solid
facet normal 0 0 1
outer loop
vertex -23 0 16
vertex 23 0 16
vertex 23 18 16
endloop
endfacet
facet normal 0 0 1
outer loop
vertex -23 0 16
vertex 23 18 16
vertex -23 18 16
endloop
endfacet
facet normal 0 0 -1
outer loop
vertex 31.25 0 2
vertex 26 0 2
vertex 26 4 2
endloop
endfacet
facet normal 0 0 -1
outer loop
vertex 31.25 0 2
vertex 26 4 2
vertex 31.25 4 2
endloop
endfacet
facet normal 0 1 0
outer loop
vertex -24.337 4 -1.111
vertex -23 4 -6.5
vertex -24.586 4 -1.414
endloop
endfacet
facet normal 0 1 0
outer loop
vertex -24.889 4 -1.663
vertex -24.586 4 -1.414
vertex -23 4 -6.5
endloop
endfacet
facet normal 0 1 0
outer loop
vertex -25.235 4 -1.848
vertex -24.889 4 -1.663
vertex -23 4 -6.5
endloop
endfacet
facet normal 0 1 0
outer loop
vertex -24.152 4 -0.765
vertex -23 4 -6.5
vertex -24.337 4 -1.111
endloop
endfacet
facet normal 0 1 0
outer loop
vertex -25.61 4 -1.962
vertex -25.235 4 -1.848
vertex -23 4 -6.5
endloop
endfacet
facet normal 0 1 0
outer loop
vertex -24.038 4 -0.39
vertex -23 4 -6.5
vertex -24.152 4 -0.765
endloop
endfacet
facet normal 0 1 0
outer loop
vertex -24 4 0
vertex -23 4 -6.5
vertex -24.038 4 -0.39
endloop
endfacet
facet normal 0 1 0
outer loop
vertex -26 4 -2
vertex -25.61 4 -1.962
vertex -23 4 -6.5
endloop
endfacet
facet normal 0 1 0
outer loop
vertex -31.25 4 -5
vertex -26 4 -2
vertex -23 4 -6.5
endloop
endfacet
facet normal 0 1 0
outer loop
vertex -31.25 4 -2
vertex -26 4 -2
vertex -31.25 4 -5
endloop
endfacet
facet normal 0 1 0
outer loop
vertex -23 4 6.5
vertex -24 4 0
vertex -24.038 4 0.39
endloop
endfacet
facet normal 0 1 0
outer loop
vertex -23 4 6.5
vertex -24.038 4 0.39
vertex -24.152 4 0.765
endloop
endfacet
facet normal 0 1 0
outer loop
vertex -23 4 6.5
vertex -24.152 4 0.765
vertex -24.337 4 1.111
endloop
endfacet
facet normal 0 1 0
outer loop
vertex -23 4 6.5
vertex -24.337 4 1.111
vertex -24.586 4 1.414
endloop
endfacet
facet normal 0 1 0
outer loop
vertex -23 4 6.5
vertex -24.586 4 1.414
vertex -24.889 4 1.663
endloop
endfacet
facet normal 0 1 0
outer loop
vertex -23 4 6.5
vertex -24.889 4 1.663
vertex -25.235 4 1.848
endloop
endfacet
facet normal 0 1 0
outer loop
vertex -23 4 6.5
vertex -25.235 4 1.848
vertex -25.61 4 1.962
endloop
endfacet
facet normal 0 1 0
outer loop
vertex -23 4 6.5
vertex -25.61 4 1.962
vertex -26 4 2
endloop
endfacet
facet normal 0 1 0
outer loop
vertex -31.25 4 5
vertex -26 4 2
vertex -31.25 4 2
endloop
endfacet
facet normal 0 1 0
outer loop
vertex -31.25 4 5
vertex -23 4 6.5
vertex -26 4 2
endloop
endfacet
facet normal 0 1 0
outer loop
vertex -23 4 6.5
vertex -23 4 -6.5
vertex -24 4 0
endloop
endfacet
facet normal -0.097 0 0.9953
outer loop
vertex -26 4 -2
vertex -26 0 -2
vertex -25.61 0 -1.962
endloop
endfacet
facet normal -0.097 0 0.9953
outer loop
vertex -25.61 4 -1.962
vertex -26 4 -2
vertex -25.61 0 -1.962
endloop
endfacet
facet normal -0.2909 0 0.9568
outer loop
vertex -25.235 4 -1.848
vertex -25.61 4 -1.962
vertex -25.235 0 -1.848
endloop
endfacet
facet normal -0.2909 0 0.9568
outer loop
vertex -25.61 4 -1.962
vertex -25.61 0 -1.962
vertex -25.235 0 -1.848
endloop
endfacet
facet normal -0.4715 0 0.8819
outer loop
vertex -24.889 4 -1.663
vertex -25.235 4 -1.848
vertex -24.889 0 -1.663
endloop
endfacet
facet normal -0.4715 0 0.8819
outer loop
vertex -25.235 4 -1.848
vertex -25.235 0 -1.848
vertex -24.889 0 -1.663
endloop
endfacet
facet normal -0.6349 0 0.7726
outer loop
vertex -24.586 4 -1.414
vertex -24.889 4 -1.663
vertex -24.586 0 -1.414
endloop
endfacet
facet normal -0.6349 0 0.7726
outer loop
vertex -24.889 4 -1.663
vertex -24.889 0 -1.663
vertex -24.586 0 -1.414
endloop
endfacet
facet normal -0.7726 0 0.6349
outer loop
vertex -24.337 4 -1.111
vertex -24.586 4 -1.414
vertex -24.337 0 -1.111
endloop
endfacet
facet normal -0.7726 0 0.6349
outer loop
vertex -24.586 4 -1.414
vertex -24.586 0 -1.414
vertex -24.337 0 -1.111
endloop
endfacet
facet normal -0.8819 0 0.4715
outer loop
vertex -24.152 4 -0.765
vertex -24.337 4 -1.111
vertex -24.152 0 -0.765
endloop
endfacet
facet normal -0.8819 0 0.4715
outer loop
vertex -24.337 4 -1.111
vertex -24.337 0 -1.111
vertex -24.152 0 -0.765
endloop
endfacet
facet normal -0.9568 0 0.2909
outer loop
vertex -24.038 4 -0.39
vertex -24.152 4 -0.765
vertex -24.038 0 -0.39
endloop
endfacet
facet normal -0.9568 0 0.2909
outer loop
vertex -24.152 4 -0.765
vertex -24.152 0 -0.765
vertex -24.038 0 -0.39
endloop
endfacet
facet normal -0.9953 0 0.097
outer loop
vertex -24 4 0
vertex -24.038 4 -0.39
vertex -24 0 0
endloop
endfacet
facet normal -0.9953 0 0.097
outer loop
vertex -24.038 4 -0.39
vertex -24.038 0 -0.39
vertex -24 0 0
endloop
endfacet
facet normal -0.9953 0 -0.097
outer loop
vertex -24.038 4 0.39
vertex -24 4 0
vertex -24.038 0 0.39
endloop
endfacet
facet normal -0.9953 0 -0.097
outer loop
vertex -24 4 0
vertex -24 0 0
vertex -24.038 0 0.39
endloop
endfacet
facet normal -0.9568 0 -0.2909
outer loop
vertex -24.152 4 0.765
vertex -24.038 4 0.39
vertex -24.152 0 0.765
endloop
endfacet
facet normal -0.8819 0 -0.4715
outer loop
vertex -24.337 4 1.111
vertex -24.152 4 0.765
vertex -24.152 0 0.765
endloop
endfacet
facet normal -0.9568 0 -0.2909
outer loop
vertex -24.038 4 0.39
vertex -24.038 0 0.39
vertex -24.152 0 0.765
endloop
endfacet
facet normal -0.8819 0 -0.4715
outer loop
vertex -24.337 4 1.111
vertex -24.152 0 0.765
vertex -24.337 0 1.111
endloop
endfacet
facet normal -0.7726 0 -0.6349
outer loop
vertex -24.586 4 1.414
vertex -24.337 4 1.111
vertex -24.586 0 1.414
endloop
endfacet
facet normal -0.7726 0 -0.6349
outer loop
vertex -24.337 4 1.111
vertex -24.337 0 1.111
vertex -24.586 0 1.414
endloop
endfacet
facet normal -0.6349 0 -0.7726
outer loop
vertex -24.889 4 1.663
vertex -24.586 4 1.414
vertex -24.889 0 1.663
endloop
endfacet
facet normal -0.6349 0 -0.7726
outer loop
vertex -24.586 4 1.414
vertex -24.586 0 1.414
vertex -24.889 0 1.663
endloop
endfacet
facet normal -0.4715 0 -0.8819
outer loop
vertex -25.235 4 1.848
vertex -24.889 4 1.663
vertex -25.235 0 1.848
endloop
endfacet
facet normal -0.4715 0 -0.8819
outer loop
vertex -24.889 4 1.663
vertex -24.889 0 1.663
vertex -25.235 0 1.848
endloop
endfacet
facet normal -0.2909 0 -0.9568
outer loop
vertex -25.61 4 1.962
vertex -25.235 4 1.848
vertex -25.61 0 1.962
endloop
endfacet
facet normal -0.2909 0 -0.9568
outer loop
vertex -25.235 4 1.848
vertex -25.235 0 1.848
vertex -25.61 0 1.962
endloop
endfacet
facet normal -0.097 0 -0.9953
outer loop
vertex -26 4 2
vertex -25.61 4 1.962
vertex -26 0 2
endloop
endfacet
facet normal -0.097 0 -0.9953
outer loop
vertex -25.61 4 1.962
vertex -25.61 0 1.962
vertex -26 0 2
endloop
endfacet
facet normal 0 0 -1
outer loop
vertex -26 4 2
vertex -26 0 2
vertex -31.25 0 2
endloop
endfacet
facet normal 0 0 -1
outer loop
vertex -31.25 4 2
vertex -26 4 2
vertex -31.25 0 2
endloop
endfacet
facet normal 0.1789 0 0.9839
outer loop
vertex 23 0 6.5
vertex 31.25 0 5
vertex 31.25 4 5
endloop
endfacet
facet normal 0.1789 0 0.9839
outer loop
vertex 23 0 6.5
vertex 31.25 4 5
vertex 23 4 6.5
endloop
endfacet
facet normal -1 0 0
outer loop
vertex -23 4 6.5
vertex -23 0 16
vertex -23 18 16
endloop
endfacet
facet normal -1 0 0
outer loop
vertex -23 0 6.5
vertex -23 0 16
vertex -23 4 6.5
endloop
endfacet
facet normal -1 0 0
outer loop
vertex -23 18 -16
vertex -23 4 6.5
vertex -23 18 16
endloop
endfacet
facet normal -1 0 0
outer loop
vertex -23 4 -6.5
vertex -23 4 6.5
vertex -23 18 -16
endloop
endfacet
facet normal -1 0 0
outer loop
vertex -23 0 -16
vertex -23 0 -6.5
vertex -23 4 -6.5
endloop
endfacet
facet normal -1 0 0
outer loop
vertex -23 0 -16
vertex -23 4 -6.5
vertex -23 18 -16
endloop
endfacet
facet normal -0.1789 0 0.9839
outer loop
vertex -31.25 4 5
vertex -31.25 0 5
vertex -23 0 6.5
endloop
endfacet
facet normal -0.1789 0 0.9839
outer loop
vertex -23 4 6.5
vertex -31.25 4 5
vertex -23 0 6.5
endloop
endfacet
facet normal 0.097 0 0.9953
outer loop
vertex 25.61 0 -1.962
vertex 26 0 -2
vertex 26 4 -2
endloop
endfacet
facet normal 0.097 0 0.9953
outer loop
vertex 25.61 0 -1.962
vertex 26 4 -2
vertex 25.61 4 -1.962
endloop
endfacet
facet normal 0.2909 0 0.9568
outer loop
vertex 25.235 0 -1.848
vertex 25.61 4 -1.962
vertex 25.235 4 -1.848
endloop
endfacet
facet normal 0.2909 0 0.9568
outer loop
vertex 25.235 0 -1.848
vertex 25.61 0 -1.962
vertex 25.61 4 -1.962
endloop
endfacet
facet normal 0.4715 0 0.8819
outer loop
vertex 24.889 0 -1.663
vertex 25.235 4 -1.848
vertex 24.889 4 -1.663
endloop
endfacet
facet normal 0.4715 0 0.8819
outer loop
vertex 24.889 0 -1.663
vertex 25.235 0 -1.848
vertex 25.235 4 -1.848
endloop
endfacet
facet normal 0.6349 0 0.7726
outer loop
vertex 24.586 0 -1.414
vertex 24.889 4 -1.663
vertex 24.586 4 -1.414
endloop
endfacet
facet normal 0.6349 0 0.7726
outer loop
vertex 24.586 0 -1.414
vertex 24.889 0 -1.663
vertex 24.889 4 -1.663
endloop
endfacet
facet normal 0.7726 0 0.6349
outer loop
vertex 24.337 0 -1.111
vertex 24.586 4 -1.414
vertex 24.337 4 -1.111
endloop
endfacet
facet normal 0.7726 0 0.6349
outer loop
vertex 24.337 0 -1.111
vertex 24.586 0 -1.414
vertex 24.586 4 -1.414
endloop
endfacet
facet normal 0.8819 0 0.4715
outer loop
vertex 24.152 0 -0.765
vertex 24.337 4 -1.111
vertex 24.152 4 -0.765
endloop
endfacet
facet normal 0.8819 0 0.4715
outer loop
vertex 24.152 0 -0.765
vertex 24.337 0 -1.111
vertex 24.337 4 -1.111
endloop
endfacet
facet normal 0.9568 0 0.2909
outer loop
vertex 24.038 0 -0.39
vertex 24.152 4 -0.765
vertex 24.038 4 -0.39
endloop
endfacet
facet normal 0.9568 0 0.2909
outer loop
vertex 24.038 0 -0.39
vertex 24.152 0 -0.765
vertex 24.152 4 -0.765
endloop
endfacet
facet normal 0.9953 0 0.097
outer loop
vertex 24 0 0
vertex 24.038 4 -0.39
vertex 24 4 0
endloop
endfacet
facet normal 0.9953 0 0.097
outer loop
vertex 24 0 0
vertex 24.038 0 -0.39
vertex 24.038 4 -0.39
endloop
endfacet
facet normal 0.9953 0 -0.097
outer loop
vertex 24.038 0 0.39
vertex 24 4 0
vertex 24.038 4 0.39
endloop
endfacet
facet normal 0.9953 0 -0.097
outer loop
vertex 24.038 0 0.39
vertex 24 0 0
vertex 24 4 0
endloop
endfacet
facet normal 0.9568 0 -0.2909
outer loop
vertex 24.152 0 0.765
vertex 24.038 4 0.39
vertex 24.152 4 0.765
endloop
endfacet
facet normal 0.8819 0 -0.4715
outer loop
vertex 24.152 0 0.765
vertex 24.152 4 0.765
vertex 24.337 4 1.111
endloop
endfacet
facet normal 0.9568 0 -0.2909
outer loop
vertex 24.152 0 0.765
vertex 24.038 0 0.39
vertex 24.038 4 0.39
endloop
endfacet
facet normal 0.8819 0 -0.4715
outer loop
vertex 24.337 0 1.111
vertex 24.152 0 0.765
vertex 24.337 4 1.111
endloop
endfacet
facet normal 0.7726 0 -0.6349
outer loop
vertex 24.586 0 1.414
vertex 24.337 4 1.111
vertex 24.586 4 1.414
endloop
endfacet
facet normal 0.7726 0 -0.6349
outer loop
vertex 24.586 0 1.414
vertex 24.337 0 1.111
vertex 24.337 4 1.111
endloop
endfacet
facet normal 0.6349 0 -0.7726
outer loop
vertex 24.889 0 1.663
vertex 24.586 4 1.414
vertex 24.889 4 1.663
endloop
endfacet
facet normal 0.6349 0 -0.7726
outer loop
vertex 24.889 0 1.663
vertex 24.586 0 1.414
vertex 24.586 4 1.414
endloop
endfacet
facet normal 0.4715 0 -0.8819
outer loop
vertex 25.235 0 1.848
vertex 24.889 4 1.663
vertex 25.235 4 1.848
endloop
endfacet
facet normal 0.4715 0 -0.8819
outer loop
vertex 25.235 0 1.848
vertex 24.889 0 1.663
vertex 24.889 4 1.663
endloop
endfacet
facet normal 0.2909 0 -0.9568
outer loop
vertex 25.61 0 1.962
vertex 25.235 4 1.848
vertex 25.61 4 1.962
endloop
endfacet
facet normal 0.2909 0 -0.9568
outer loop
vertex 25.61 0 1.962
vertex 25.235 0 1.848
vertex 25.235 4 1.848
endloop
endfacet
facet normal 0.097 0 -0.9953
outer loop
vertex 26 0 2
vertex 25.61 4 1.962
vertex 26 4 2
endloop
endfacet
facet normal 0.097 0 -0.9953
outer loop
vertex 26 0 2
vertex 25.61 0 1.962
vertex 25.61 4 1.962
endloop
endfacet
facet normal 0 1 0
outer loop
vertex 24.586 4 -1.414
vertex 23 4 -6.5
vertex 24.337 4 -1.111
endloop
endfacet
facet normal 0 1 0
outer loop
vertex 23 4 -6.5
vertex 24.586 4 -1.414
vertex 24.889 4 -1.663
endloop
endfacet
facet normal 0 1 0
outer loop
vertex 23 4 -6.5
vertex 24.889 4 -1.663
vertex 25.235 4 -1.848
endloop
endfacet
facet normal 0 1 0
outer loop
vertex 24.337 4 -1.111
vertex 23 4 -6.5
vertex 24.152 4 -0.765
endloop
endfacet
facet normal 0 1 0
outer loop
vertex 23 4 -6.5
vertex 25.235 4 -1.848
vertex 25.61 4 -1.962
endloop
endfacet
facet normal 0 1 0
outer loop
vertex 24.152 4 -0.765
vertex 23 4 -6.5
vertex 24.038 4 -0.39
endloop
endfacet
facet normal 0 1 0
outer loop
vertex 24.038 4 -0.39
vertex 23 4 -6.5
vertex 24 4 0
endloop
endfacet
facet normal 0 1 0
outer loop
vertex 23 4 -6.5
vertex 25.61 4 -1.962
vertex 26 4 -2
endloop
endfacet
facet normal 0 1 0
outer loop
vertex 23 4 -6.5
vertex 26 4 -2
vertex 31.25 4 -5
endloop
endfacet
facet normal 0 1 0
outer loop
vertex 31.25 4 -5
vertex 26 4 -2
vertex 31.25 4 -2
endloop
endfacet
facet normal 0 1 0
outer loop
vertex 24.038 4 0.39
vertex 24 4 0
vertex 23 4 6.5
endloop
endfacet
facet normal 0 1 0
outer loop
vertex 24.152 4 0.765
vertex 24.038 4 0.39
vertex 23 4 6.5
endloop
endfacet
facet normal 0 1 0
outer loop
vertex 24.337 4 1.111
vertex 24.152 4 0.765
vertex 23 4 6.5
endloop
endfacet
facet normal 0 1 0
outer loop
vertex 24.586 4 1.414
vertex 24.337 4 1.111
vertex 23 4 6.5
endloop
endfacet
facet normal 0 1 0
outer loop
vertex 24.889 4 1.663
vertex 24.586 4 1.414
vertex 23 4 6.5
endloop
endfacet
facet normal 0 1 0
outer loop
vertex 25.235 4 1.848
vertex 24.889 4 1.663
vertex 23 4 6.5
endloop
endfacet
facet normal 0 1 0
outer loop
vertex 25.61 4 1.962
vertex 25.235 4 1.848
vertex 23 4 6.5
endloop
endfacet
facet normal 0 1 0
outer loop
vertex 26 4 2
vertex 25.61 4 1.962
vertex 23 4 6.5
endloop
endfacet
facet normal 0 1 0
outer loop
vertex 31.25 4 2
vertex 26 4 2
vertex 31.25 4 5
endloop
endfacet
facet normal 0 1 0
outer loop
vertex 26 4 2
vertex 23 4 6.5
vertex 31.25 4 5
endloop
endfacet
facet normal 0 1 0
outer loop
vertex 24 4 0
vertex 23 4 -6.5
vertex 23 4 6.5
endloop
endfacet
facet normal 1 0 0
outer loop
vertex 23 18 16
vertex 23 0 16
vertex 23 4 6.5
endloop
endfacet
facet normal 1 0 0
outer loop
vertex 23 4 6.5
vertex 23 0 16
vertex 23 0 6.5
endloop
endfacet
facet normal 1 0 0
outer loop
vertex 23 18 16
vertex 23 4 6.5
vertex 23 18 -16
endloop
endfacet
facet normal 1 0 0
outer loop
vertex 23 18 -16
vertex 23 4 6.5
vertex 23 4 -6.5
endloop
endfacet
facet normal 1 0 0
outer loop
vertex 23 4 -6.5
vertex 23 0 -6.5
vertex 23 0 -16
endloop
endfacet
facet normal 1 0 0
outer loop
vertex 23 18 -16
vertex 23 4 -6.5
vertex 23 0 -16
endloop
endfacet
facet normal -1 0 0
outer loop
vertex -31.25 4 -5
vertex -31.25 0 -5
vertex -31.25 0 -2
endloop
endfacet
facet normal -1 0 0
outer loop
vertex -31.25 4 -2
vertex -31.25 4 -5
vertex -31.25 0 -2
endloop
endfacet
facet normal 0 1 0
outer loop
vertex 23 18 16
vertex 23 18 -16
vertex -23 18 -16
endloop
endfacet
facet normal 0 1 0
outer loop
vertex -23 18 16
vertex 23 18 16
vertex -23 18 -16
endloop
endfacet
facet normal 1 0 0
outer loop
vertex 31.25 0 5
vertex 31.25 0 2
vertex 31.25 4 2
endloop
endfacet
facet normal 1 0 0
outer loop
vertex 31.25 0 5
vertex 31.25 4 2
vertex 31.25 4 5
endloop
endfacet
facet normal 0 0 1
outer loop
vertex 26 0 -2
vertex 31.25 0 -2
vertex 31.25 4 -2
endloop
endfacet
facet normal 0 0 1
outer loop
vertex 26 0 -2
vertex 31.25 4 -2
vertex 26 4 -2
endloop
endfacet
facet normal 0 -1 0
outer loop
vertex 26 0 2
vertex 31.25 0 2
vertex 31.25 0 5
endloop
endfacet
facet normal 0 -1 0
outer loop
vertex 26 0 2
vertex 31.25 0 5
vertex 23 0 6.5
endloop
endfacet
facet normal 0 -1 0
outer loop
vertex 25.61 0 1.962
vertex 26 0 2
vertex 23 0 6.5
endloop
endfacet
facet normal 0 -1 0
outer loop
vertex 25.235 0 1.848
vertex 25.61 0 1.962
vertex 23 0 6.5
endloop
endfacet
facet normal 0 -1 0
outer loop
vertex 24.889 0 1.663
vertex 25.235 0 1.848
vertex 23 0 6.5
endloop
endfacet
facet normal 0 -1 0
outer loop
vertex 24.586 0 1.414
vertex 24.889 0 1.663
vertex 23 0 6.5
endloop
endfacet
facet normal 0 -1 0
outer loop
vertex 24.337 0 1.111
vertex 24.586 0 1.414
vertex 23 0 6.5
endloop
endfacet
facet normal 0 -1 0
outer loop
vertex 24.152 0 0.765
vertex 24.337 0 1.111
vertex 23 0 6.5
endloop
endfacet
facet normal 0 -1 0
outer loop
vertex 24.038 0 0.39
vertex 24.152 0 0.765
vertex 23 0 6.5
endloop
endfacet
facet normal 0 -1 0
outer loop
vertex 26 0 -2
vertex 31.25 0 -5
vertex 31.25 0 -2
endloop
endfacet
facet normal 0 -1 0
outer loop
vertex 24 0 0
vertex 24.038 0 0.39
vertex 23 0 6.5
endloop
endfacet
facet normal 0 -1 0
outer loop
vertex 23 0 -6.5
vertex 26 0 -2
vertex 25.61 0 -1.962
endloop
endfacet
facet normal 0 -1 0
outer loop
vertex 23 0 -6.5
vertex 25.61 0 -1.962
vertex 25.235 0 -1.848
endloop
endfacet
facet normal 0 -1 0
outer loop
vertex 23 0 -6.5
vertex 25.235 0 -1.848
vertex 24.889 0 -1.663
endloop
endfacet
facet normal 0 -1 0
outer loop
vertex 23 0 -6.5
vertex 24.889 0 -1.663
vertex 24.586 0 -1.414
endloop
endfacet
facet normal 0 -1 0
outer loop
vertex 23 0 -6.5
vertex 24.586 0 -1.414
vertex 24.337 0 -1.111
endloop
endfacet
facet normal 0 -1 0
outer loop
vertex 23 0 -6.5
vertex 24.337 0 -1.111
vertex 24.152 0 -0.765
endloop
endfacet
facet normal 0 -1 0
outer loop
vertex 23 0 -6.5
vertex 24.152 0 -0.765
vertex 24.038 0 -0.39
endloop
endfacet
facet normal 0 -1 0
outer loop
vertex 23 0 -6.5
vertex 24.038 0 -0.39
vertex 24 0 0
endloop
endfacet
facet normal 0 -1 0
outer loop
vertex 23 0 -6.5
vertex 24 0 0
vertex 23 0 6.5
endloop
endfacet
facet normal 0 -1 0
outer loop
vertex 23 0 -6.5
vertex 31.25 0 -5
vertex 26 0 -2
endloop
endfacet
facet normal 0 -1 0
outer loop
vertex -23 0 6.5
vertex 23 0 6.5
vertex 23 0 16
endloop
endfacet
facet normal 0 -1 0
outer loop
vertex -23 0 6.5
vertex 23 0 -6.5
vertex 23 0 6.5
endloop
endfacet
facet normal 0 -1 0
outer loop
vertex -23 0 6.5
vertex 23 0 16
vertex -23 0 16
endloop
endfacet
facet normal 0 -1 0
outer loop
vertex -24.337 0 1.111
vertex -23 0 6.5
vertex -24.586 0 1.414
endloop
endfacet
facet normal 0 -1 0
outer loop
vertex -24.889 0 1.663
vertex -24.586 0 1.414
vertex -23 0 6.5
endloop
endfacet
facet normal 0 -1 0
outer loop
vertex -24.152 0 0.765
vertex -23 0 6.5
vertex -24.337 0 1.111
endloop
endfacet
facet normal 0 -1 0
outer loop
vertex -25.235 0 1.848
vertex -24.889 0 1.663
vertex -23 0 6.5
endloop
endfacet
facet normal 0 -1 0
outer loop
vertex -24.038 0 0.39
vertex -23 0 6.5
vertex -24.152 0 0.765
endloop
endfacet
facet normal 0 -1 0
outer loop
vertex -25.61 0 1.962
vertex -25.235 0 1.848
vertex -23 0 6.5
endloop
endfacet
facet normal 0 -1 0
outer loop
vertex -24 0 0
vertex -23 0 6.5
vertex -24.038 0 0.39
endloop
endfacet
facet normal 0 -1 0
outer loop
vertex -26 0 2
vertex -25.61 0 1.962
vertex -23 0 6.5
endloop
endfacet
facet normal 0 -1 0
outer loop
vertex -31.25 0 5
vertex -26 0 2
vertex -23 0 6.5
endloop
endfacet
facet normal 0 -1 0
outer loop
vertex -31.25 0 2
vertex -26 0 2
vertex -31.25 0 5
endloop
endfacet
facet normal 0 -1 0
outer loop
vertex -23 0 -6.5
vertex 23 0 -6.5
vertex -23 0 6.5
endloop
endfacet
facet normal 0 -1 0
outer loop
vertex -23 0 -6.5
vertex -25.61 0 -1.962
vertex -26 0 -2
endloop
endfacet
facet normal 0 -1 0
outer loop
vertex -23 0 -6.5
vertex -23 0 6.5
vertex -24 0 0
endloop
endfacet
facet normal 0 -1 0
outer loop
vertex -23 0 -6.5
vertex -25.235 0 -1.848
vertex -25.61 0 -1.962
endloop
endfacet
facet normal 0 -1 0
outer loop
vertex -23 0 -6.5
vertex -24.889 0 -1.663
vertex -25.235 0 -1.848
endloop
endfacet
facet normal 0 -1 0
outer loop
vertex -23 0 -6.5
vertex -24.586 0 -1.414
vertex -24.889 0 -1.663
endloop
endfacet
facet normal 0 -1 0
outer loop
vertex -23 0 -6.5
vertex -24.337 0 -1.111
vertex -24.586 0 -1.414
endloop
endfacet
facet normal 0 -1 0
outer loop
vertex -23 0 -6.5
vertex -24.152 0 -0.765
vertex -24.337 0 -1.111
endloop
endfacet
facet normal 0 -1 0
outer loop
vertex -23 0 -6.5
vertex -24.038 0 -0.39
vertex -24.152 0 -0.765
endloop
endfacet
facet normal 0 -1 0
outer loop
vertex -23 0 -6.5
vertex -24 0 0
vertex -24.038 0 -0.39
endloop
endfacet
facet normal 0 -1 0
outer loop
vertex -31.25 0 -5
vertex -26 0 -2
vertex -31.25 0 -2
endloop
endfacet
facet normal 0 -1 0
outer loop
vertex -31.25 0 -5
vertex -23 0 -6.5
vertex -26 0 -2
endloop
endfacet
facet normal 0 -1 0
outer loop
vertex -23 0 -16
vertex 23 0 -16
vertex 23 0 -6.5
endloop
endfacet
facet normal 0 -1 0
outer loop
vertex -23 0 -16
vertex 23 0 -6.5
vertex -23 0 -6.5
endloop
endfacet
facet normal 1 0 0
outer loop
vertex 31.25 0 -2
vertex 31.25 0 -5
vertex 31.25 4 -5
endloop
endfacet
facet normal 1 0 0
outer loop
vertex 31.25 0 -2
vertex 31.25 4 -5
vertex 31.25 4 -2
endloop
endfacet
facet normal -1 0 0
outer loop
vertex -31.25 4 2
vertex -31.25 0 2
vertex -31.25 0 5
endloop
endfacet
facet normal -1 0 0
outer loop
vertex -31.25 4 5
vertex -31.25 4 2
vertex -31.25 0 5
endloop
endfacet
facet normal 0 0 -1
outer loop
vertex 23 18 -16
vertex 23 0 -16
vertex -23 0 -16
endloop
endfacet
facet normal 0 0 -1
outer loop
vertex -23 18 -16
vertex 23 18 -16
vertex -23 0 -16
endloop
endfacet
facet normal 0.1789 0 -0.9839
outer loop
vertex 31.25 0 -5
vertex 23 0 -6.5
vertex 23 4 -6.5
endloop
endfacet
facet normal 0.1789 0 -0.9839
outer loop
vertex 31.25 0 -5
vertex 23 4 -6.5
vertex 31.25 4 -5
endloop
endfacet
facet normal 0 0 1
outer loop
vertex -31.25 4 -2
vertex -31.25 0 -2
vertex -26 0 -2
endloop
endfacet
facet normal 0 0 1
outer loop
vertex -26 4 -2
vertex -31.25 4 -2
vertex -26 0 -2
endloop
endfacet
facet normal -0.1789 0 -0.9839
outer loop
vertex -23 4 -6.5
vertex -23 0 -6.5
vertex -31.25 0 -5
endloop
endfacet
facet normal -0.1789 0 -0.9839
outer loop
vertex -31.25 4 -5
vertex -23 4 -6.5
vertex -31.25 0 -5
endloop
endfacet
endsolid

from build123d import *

# Parameters (mm, degrees)
SKETCH1_W           = 23
SKETCH1_H           = 32
BOSS_EXTRUDE1_DEPTH = 18
BOSS_EXTRUDE2_DEPTH = 4


with BuildPart() as part:
    # Sketch1 → Boss-Extrude1 (new body)
    with BuildSketch(Plane(origin=(0, 0, 0), x_dir=(1, 0, 0), z_dir=(0, 1, 0))):
        with Locations((-11.5, 0)):
            Rectangle(SKETCH1_W, SKETCH1_H)
    boss_extrude1 = extrude(amount=BOSS_EXTRUDE1_DEPTH)

    # Sketch2 → Boss-Extrude2 (add)
    with BuildSketch(Plane.XZ):
        with BuildLine():
            Line((-31.25, -5), (-31.25, -2))
            Line((-31.25, -2), (-26, -2))
            ThreePointArc((-26, -2), (-24, 0), (-26, 2))
            Line((-26, 2), (-31.25, 2))
            Line((-31.25, 2), (-31.25, 5))
            Line((-31.25, 5), (-23, 6.5))
            Line((-23, 6.5), (-23, -6.5))
            Line((-23, -6.5), (-31.25, -5))
        make_face()
    boss_extrude2 = extrude(amount=-BOSS_EXTRUDE2_DEPTH)

    # Mirror1: Boss-Extrude1, Boss-Extrude2 across plane
    add(boss_extrude1.mirror(Plane(origin=(0, 18, 16), x_dir=(0, 0, 1), z_dir=(-1, 0, 0))))
    add(boss_extrude2.mirror(Plane(origin=(0, 18, 16), x_dir=(0, 0, 1), z_dir=(-1, 0, 0))))


solid = part.part
